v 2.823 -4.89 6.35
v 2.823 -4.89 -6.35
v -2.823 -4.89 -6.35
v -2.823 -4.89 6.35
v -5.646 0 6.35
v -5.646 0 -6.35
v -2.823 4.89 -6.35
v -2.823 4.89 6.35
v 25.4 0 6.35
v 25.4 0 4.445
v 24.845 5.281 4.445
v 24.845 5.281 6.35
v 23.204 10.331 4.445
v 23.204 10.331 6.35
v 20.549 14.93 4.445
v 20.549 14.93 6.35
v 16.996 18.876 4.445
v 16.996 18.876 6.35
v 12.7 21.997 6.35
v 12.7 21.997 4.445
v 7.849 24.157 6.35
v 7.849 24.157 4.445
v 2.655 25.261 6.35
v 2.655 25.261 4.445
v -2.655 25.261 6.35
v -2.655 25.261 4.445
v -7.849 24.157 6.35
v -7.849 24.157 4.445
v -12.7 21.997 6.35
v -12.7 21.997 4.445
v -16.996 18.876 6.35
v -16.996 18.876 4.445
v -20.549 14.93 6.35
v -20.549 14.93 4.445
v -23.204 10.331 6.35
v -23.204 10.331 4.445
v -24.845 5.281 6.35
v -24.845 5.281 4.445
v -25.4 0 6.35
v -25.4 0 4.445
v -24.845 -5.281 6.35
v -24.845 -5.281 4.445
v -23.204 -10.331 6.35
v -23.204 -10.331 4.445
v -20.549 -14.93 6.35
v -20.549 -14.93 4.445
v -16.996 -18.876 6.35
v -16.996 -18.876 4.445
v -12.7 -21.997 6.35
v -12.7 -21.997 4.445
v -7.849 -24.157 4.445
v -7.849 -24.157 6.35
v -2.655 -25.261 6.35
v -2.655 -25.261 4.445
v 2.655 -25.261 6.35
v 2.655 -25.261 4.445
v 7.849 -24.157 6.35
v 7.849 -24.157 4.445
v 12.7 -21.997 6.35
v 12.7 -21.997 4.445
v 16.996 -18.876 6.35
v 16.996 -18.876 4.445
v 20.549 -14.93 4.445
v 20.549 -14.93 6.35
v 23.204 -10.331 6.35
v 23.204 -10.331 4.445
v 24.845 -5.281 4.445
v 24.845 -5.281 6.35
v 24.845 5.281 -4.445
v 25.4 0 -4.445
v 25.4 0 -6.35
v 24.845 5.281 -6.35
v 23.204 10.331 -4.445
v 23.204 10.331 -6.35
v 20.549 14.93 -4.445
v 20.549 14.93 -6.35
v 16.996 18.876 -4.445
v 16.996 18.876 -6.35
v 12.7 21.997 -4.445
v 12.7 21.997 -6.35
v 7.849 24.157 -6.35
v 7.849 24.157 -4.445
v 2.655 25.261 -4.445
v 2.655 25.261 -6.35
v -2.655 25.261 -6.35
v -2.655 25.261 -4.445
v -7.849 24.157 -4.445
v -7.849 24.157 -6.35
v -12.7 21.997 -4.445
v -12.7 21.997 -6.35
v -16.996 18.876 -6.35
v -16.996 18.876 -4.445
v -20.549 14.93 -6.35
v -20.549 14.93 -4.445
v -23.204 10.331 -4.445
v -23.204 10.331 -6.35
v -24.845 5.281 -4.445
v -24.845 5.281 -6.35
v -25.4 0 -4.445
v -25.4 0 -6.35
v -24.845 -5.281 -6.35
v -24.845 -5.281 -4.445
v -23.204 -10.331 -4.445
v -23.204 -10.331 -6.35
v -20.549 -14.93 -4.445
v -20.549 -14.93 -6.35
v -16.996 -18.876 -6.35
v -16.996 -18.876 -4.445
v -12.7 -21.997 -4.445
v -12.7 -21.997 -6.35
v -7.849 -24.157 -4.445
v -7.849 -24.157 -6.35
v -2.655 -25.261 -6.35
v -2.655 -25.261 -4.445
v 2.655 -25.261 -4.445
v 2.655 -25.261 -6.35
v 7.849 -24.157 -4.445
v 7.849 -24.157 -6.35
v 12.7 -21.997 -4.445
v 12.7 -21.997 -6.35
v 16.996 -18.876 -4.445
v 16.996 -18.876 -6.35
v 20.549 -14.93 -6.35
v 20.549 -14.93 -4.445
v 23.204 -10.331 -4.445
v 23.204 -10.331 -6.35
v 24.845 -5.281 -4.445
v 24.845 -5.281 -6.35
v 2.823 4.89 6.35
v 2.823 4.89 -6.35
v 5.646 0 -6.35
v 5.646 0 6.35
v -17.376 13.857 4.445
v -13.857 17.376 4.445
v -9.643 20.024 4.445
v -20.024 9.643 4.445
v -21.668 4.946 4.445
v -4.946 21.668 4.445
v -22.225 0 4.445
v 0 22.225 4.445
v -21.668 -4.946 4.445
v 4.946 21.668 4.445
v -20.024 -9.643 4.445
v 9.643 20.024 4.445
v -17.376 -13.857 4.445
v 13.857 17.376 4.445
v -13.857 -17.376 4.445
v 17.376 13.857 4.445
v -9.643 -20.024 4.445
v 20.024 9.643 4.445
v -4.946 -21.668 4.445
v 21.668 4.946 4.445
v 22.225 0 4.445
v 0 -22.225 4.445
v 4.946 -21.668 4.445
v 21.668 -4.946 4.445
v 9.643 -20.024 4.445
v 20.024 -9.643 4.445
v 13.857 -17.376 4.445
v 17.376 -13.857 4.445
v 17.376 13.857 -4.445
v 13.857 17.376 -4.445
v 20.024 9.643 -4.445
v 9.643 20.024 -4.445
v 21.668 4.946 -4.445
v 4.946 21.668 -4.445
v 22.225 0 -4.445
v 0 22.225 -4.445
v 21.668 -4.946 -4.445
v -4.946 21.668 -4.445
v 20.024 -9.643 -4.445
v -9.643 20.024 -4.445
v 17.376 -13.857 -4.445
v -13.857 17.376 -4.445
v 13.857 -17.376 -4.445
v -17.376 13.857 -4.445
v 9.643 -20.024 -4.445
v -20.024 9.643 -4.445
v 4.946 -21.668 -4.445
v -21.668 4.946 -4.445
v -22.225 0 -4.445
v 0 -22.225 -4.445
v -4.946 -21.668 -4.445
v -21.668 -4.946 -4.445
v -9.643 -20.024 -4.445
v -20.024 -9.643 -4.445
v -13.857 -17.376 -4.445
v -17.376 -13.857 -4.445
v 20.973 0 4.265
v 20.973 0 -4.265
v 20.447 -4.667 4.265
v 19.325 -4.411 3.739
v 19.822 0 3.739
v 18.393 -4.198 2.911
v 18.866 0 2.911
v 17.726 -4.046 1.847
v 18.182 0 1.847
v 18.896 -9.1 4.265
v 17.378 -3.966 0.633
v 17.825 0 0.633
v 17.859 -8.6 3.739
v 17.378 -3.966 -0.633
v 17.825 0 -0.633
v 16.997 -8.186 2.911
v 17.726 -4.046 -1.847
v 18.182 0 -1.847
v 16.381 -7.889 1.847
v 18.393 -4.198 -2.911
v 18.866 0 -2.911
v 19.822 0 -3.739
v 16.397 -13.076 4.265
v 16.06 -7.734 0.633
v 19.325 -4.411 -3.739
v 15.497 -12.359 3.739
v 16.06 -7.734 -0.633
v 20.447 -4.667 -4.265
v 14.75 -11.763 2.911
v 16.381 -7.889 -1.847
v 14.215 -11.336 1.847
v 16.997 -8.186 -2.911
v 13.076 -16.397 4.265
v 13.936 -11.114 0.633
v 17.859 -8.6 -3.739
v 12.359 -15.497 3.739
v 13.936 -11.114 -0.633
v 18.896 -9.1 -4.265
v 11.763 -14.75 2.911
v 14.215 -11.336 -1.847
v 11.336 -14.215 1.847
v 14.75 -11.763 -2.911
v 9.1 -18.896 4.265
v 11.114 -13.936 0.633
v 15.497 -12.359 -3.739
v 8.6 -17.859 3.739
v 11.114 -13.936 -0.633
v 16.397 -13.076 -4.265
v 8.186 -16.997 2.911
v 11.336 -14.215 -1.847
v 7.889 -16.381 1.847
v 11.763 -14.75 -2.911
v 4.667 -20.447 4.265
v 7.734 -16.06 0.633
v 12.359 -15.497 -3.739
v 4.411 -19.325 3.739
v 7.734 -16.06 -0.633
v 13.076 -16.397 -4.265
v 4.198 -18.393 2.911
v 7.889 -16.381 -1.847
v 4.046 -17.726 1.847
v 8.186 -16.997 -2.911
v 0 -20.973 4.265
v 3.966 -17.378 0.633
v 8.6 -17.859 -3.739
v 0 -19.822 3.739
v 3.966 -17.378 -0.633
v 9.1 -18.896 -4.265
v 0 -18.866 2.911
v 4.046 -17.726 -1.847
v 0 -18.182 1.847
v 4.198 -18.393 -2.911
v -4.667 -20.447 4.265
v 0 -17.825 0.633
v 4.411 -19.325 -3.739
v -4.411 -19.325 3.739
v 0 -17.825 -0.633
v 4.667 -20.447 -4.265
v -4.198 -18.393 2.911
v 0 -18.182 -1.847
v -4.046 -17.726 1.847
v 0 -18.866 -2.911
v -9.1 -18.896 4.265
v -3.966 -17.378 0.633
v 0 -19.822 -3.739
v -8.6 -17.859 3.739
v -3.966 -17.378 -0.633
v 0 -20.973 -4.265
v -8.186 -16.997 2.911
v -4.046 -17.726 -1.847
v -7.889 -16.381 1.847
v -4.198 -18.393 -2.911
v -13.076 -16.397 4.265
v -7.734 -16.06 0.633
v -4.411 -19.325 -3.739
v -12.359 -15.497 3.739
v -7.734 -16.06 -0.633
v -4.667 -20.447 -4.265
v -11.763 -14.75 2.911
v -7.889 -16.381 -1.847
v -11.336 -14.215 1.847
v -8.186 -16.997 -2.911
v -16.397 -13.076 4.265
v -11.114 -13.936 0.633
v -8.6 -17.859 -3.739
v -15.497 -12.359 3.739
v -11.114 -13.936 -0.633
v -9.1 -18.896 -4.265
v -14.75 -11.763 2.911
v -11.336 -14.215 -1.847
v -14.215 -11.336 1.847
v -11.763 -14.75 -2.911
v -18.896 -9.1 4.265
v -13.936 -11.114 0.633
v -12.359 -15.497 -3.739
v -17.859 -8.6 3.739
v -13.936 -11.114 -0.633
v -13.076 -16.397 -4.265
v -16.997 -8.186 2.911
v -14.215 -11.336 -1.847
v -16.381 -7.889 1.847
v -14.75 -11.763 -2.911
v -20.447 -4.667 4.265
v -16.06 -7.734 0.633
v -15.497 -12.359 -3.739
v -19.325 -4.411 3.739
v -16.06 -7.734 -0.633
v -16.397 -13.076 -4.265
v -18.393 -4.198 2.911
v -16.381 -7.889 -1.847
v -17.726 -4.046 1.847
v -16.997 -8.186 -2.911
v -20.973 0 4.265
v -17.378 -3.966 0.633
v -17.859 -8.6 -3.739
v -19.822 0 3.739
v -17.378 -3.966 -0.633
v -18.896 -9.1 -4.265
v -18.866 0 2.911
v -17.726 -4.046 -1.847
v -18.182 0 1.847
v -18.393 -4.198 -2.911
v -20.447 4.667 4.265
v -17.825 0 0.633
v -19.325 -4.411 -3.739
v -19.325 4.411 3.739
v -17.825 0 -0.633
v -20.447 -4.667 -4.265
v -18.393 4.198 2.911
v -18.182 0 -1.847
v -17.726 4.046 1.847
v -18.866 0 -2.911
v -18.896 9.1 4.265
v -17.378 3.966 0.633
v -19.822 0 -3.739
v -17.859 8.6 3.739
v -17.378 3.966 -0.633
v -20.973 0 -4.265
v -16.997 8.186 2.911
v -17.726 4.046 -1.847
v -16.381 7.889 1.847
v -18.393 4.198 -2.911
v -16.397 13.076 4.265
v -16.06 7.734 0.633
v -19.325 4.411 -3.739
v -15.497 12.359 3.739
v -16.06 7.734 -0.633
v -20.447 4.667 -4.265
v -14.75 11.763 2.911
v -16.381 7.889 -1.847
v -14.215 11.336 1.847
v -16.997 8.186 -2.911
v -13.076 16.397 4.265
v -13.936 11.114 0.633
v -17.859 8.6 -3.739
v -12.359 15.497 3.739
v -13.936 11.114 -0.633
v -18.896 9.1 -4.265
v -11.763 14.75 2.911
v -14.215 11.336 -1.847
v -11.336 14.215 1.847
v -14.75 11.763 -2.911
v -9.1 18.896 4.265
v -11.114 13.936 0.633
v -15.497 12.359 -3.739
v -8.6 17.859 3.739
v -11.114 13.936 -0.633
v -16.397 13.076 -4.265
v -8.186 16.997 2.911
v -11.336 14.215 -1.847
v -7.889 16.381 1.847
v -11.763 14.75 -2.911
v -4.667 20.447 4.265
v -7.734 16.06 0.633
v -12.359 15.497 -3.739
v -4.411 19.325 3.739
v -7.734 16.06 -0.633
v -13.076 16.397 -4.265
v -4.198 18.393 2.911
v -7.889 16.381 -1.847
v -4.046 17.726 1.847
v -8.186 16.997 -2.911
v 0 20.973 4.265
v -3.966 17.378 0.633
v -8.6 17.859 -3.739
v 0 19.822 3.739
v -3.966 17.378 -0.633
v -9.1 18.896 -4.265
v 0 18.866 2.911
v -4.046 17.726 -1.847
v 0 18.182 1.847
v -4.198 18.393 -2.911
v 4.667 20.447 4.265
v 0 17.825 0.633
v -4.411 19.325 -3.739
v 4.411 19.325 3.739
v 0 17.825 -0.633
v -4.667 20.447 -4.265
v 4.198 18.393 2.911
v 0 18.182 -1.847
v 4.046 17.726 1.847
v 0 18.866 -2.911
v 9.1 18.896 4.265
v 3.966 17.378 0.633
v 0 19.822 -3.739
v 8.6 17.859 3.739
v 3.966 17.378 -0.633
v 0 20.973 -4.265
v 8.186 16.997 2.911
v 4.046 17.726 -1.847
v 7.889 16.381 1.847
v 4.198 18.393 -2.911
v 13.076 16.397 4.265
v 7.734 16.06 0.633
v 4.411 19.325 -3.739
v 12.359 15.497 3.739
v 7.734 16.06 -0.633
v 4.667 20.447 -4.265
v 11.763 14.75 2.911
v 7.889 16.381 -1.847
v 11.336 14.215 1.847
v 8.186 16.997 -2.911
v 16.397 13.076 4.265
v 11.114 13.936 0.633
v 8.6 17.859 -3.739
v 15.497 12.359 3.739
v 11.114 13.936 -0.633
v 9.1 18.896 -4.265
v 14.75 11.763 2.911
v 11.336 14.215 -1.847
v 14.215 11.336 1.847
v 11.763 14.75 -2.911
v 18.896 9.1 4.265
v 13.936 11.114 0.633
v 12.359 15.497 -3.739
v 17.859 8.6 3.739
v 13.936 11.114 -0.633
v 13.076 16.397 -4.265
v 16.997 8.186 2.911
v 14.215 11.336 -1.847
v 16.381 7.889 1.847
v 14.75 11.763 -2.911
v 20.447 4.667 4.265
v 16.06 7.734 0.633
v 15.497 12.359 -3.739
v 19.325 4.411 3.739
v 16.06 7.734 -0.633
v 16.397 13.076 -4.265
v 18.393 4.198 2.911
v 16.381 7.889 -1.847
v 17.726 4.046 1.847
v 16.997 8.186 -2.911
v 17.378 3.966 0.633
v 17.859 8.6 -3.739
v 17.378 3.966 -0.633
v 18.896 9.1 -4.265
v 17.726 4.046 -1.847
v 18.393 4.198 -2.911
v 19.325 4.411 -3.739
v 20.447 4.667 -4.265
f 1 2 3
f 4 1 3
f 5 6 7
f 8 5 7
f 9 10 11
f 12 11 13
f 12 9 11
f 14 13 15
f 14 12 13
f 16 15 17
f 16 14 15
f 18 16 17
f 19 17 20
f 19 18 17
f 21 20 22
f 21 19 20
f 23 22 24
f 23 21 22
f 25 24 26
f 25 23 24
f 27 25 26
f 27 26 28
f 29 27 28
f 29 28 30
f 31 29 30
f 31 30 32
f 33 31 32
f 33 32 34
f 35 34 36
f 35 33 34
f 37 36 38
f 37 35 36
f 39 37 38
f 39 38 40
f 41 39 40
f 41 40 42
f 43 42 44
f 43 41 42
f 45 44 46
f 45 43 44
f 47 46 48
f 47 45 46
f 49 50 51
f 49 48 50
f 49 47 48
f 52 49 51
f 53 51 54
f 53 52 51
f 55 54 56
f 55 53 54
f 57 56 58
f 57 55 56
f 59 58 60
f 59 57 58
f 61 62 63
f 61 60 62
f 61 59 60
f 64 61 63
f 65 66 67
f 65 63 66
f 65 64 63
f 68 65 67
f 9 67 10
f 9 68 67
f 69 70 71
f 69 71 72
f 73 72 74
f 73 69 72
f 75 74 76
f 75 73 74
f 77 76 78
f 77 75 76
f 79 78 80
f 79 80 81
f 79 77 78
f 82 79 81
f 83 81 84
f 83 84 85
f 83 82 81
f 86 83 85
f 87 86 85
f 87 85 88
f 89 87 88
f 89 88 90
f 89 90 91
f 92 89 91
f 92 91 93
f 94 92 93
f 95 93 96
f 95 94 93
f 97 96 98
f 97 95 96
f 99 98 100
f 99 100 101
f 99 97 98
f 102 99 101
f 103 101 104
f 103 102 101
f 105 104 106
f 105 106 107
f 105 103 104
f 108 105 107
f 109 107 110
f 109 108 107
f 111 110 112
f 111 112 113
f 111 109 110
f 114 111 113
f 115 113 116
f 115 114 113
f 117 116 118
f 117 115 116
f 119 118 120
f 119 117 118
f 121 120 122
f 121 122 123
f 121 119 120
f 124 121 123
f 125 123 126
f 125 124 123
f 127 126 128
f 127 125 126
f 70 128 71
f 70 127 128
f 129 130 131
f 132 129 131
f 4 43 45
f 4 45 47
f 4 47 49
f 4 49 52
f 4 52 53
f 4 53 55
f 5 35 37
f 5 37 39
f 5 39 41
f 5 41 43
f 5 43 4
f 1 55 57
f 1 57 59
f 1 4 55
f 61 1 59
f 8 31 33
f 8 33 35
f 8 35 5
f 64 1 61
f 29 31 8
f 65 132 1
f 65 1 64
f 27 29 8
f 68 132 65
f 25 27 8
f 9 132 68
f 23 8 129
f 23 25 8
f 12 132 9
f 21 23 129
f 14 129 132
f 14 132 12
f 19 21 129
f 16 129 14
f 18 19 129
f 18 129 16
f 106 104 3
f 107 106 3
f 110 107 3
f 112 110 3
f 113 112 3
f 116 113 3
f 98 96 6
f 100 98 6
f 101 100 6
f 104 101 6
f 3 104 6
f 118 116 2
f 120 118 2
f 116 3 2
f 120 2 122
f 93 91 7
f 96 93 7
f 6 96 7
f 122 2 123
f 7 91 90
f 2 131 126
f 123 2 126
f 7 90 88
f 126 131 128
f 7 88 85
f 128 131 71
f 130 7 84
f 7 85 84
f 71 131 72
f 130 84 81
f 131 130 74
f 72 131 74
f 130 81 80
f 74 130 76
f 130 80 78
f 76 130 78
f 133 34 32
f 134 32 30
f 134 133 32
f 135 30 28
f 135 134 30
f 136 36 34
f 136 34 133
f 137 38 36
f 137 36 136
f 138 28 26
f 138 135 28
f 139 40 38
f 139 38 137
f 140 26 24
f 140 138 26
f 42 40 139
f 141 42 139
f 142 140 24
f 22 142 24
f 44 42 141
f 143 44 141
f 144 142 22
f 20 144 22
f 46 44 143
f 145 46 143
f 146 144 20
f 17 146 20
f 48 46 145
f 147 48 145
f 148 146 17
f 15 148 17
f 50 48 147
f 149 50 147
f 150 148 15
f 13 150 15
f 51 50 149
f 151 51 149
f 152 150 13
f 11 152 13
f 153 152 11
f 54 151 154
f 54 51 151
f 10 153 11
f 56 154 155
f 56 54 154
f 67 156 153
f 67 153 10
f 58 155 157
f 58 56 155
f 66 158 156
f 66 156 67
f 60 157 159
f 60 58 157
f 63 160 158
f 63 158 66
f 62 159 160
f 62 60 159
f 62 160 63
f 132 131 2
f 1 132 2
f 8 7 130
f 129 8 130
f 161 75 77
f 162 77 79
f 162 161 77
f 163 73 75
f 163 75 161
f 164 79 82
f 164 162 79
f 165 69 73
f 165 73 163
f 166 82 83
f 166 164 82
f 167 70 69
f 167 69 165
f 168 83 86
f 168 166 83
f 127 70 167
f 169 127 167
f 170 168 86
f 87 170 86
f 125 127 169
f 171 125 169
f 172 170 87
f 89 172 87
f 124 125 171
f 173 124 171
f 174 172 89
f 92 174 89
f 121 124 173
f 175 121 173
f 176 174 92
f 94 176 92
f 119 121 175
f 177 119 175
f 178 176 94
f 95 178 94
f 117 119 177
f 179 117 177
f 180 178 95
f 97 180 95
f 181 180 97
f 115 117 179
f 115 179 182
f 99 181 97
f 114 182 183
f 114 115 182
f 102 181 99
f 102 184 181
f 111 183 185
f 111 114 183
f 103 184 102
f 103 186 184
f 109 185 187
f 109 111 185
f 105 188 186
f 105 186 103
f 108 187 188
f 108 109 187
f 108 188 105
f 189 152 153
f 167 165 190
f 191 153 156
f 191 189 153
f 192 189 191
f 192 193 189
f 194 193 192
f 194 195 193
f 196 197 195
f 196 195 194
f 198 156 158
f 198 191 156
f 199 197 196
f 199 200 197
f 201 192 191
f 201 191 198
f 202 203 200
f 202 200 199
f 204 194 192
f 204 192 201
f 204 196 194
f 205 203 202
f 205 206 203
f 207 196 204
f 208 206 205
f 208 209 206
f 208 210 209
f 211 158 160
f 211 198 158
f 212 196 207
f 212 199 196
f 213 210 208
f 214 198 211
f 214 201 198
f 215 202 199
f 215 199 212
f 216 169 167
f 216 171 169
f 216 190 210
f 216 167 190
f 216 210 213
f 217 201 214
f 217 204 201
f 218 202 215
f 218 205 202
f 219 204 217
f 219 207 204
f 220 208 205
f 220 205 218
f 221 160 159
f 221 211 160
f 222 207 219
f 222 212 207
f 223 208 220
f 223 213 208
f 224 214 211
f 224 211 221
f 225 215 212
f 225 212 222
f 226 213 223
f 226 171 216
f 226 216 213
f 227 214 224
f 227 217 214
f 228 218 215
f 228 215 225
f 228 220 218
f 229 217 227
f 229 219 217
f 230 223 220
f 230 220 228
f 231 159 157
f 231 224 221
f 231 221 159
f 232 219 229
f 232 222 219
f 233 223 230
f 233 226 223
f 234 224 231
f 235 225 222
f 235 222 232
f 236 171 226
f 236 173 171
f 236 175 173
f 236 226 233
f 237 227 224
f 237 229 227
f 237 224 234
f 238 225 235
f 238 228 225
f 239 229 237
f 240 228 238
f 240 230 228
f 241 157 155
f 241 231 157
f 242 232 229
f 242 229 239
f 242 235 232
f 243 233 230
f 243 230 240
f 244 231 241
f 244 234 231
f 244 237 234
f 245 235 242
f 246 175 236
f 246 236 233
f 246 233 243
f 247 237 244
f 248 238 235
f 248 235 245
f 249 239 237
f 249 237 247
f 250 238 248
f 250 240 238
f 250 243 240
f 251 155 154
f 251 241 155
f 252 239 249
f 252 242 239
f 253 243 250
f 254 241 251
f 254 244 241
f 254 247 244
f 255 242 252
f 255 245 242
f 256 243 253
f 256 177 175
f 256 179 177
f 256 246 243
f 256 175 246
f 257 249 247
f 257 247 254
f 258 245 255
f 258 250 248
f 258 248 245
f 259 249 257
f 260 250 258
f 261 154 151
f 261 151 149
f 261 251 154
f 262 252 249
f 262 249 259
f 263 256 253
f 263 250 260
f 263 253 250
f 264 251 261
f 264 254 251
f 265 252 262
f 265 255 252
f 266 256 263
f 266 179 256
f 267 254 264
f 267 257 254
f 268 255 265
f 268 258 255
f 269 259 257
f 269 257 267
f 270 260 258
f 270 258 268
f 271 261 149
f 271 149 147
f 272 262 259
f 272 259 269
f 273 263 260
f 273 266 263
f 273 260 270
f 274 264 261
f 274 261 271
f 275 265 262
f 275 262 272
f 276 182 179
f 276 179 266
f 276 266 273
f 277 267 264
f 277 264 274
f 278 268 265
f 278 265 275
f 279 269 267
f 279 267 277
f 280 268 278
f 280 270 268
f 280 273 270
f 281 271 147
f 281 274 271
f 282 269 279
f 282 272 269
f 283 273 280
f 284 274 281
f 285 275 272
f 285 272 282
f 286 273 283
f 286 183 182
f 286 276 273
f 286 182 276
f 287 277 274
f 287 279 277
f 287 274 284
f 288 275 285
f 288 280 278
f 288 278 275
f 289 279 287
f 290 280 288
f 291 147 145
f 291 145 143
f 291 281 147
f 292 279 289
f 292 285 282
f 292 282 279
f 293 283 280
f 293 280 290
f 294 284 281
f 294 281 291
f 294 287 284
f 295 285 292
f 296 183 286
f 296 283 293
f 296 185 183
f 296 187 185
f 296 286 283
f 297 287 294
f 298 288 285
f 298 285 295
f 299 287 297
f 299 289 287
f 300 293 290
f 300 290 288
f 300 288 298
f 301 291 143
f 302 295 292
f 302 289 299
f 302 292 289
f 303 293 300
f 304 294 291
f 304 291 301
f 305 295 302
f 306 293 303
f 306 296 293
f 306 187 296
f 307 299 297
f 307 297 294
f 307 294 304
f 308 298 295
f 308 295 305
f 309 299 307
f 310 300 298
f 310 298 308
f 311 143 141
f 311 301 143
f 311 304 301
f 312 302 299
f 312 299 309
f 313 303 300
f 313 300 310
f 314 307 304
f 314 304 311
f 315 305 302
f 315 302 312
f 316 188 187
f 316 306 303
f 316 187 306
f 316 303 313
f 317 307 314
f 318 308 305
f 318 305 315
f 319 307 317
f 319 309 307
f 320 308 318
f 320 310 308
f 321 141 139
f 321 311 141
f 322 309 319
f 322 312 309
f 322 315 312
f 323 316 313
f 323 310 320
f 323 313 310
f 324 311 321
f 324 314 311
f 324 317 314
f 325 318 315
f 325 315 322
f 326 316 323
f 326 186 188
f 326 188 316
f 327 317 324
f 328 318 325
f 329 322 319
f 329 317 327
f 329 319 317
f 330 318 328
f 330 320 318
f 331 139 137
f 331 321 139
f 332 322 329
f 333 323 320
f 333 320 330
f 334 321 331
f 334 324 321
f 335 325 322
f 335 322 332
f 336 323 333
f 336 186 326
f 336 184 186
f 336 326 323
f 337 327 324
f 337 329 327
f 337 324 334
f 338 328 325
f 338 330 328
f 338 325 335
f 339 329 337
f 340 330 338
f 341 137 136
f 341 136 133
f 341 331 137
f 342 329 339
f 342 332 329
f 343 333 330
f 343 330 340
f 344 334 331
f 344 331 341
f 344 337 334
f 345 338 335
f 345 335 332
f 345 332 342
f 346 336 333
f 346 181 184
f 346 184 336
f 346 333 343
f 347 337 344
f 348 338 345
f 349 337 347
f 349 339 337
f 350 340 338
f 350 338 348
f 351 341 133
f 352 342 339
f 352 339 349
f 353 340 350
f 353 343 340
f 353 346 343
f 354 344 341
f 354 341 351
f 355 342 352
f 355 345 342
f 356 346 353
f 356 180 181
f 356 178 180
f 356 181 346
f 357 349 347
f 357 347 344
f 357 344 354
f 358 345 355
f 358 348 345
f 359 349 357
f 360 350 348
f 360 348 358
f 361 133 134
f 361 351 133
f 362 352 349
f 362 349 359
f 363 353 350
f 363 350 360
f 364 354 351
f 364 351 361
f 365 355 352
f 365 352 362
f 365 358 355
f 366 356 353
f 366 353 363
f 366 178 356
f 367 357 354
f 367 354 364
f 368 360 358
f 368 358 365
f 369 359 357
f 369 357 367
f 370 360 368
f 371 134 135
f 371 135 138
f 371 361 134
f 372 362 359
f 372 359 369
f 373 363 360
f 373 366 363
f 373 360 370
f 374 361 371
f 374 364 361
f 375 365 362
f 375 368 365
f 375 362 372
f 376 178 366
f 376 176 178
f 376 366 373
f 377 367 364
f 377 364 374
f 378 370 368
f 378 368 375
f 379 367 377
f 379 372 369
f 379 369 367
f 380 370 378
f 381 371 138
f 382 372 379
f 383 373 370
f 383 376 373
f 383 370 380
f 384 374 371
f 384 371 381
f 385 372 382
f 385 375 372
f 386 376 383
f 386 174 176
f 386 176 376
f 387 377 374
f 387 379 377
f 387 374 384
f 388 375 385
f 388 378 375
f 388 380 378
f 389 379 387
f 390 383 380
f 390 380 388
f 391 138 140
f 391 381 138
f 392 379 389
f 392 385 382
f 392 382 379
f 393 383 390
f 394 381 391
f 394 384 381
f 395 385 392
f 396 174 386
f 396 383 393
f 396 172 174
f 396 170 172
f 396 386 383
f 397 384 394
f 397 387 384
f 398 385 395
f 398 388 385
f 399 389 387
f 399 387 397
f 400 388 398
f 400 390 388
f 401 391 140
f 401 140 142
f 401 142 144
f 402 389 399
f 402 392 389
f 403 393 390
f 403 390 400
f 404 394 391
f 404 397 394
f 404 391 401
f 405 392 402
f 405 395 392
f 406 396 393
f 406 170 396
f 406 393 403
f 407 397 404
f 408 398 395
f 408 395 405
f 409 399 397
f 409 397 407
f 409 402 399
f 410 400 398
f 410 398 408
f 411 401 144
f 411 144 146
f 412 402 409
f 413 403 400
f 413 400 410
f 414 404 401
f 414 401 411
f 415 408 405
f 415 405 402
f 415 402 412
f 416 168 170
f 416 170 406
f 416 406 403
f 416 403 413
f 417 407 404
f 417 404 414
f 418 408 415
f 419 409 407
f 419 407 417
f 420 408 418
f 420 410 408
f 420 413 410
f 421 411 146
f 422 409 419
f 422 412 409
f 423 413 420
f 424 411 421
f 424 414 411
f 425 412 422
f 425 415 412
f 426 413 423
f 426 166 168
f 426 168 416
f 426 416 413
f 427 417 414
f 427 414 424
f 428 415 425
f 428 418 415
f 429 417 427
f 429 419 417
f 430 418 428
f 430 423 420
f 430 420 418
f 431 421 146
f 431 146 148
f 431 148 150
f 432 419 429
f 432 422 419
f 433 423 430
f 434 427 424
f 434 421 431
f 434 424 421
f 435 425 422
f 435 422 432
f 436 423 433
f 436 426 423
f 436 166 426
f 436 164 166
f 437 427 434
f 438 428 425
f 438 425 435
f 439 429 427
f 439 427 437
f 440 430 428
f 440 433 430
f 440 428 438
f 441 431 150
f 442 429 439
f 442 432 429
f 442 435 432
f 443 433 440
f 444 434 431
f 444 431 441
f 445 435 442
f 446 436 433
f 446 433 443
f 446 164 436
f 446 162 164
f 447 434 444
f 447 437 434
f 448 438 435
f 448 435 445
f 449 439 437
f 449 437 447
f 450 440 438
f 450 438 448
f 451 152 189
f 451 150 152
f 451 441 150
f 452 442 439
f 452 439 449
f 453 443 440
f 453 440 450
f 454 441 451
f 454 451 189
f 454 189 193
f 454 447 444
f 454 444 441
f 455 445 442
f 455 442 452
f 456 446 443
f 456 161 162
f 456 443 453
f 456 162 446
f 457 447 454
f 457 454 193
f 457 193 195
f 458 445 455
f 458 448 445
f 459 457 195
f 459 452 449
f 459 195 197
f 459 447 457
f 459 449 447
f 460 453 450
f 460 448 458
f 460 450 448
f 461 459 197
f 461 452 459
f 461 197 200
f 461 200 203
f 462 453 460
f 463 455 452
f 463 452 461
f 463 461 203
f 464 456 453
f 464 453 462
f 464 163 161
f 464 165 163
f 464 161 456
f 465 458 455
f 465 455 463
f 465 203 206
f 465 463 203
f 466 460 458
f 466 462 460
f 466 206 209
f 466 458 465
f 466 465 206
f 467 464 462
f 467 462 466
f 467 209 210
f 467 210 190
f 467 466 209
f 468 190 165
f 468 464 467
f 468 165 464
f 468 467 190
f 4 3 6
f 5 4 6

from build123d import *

# Parameters (mm, degrees)
SKETCH1_R           = 25.4
BOSS_EXTRUDE1_DEPTH = 6.35
CUT_EXTRUDE1_DEPTH  = 39.1


with BuildPart() as part:
    # Sketch1 → Boss-Extrude1 (new, symmetric)
    with BuildSketch(Plane.XY):
        Circle(SKETCH1_R)
    extrude(amount=BOSS_EXTRUDE1_DEPTH, both=True)

    # Sketch3 → Cut-Revolve1 (revolve, cut)
    with BuildSketch(Plane(origin=(0, 0, 0), x_dir=(1, 0, 0), z_dir=(0, 1, 0)), mode=Mode.PRIVATE) as cut_revolve1_sk:
        with BuildLine():
            Line((-25.4, 4.445), (-25.4, -4.445))
            Line((-25.4, -4.445), (-22.225, -4.445))
            ThreePointArc((-22.225, -4.445), (-17.78, 0), (-22.225, 4.445))
            Line((-22.225, 4.445), (-25.4, 4.445))
        make_face()
    revolve(cut_revolve1_sk.sketch.rotate(Axis((0, 0, 17.119668281), (0, 0, -1)), 180), axis=Axis((0, 0, 17.119668281), (0, 0, -1)), mode=Mode.SUBTRACT)

    # Sketch4 → Cut-Extrude1 (cut, through all)
    with BuildSketch(Plane(origin=(0, 0, -6.35), x_dir=(-1, 0, 0), z_dir=(0, 0, -1))):
        Polygon((5.645908282, 0), (2.822954141, 4.8895), (-2.822954141, 4.8895), (-5.645908282, 0), (-2.822954141, -4.8895), (2.822954141, -4.8895), align=None)
    extrude(amount=-CUT_EXTRUDE1_DEPTH, mode=Mode.SUBTRACT)


solid = part.part
